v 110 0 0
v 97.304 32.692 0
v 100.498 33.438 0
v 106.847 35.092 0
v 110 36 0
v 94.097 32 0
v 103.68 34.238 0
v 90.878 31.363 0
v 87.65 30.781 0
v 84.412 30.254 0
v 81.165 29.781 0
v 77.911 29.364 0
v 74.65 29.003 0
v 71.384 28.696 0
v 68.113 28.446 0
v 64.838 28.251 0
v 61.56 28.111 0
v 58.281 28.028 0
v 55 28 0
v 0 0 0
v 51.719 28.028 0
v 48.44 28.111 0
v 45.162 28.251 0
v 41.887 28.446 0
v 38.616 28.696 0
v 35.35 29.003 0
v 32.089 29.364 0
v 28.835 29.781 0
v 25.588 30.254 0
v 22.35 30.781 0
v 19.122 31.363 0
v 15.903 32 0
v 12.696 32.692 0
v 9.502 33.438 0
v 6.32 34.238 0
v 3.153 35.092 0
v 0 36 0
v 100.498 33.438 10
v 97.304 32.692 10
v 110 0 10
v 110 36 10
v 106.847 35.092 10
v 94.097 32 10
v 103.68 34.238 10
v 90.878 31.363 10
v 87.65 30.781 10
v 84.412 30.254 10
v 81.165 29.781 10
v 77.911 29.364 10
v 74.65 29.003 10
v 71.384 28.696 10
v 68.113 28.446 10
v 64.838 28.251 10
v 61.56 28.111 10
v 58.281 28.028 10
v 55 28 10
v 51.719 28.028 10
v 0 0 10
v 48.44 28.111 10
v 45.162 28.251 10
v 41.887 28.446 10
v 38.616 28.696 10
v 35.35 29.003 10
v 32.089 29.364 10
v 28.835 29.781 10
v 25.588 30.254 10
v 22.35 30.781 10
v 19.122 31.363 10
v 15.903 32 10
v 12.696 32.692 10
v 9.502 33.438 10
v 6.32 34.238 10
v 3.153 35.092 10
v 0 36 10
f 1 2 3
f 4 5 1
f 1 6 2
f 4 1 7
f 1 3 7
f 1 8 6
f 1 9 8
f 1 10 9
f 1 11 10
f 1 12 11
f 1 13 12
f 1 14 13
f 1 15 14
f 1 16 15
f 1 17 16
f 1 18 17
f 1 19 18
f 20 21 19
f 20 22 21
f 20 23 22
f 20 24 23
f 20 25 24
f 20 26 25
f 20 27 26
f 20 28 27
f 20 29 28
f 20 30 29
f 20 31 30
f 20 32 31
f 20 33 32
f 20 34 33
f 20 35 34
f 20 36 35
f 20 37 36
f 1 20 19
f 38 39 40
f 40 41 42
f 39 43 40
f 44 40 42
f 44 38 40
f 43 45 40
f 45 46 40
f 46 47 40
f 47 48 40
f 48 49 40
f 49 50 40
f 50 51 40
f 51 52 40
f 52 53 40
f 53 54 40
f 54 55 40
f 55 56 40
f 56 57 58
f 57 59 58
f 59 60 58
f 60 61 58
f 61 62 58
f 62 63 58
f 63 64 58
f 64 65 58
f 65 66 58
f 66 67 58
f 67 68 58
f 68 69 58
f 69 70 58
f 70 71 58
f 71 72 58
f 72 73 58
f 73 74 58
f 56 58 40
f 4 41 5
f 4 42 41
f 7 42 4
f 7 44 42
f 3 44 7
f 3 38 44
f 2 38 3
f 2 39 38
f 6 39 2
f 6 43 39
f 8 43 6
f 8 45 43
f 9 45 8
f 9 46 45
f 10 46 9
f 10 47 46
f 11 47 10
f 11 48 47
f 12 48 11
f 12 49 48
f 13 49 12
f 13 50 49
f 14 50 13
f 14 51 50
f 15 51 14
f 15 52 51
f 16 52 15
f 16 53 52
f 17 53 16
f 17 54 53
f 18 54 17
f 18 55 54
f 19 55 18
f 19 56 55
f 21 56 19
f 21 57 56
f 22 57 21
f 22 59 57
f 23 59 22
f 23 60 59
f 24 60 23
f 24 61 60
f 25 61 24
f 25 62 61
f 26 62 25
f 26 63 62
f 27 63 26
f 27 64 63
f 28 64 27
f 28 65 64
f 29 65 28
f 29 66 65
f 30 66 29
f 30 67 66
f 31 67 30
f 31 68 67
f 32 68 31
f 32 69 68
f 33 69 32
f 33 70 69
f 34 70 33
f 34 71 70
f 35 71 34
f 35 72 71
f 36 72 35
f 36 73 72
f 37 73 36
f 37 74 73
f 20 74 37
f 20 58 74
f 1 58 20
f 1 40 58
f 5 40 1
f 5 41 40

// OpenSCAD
$fn = 32;

// ----------------------------------------------------------------------
// Arc profile plate: notch, 37 points
// ----------------------------------------------------------------------

// --- parameters (mm) ---
bar_l = 110;              // bar length, X
bar_w = 36;               // bar width, Y
notch_depth = 8;          // depth of the arc notch at mid-span
arc_r = 193.06;           // radius of the notch arc
arc_angle = 33.1;         // notch arc angle, degrees
arc_step = 1;             // sampling step of the notch arc, degrees
plate_t = 10;             // plate thickness, Z

profile = [[0, 0], [110, 0], [110, 36], [106.847, 35.092], [103.68, 34.238], [100.498, 33.438], [97.304, 32.692], [94.097, 32], [90.878, 31.363], [87.65, 30.781], [84.412, 30.254], [81.165, 29.781], [77.911, 29.364], [74.65, 29.003], [71.384, 28.696], [68.113, 28.446], [64.838, 28.251], [61.56, 28.111], [58.281, 28.028], [55, 28], [51.719, 28.028], [48.44, 28.111], [45.162, 28.251], [41.887, 28.446], [38.616, 28.696], [35.35, 29.003], [32.089, 29.364], [28.835, 29.781], [25.588, 30.254], [22.35, 30.781], [19.122, 31.363], [15.903, 32], [12.696, 32.692], [9.502, 33.438], [6.32, 34.238], [3.153, 35.092], [0, 36]];  // primary outline, 37 points, counter clockwise

// --- the one profile operation ---
linear_extrude(height = plate_t) polygon(points = profile);
